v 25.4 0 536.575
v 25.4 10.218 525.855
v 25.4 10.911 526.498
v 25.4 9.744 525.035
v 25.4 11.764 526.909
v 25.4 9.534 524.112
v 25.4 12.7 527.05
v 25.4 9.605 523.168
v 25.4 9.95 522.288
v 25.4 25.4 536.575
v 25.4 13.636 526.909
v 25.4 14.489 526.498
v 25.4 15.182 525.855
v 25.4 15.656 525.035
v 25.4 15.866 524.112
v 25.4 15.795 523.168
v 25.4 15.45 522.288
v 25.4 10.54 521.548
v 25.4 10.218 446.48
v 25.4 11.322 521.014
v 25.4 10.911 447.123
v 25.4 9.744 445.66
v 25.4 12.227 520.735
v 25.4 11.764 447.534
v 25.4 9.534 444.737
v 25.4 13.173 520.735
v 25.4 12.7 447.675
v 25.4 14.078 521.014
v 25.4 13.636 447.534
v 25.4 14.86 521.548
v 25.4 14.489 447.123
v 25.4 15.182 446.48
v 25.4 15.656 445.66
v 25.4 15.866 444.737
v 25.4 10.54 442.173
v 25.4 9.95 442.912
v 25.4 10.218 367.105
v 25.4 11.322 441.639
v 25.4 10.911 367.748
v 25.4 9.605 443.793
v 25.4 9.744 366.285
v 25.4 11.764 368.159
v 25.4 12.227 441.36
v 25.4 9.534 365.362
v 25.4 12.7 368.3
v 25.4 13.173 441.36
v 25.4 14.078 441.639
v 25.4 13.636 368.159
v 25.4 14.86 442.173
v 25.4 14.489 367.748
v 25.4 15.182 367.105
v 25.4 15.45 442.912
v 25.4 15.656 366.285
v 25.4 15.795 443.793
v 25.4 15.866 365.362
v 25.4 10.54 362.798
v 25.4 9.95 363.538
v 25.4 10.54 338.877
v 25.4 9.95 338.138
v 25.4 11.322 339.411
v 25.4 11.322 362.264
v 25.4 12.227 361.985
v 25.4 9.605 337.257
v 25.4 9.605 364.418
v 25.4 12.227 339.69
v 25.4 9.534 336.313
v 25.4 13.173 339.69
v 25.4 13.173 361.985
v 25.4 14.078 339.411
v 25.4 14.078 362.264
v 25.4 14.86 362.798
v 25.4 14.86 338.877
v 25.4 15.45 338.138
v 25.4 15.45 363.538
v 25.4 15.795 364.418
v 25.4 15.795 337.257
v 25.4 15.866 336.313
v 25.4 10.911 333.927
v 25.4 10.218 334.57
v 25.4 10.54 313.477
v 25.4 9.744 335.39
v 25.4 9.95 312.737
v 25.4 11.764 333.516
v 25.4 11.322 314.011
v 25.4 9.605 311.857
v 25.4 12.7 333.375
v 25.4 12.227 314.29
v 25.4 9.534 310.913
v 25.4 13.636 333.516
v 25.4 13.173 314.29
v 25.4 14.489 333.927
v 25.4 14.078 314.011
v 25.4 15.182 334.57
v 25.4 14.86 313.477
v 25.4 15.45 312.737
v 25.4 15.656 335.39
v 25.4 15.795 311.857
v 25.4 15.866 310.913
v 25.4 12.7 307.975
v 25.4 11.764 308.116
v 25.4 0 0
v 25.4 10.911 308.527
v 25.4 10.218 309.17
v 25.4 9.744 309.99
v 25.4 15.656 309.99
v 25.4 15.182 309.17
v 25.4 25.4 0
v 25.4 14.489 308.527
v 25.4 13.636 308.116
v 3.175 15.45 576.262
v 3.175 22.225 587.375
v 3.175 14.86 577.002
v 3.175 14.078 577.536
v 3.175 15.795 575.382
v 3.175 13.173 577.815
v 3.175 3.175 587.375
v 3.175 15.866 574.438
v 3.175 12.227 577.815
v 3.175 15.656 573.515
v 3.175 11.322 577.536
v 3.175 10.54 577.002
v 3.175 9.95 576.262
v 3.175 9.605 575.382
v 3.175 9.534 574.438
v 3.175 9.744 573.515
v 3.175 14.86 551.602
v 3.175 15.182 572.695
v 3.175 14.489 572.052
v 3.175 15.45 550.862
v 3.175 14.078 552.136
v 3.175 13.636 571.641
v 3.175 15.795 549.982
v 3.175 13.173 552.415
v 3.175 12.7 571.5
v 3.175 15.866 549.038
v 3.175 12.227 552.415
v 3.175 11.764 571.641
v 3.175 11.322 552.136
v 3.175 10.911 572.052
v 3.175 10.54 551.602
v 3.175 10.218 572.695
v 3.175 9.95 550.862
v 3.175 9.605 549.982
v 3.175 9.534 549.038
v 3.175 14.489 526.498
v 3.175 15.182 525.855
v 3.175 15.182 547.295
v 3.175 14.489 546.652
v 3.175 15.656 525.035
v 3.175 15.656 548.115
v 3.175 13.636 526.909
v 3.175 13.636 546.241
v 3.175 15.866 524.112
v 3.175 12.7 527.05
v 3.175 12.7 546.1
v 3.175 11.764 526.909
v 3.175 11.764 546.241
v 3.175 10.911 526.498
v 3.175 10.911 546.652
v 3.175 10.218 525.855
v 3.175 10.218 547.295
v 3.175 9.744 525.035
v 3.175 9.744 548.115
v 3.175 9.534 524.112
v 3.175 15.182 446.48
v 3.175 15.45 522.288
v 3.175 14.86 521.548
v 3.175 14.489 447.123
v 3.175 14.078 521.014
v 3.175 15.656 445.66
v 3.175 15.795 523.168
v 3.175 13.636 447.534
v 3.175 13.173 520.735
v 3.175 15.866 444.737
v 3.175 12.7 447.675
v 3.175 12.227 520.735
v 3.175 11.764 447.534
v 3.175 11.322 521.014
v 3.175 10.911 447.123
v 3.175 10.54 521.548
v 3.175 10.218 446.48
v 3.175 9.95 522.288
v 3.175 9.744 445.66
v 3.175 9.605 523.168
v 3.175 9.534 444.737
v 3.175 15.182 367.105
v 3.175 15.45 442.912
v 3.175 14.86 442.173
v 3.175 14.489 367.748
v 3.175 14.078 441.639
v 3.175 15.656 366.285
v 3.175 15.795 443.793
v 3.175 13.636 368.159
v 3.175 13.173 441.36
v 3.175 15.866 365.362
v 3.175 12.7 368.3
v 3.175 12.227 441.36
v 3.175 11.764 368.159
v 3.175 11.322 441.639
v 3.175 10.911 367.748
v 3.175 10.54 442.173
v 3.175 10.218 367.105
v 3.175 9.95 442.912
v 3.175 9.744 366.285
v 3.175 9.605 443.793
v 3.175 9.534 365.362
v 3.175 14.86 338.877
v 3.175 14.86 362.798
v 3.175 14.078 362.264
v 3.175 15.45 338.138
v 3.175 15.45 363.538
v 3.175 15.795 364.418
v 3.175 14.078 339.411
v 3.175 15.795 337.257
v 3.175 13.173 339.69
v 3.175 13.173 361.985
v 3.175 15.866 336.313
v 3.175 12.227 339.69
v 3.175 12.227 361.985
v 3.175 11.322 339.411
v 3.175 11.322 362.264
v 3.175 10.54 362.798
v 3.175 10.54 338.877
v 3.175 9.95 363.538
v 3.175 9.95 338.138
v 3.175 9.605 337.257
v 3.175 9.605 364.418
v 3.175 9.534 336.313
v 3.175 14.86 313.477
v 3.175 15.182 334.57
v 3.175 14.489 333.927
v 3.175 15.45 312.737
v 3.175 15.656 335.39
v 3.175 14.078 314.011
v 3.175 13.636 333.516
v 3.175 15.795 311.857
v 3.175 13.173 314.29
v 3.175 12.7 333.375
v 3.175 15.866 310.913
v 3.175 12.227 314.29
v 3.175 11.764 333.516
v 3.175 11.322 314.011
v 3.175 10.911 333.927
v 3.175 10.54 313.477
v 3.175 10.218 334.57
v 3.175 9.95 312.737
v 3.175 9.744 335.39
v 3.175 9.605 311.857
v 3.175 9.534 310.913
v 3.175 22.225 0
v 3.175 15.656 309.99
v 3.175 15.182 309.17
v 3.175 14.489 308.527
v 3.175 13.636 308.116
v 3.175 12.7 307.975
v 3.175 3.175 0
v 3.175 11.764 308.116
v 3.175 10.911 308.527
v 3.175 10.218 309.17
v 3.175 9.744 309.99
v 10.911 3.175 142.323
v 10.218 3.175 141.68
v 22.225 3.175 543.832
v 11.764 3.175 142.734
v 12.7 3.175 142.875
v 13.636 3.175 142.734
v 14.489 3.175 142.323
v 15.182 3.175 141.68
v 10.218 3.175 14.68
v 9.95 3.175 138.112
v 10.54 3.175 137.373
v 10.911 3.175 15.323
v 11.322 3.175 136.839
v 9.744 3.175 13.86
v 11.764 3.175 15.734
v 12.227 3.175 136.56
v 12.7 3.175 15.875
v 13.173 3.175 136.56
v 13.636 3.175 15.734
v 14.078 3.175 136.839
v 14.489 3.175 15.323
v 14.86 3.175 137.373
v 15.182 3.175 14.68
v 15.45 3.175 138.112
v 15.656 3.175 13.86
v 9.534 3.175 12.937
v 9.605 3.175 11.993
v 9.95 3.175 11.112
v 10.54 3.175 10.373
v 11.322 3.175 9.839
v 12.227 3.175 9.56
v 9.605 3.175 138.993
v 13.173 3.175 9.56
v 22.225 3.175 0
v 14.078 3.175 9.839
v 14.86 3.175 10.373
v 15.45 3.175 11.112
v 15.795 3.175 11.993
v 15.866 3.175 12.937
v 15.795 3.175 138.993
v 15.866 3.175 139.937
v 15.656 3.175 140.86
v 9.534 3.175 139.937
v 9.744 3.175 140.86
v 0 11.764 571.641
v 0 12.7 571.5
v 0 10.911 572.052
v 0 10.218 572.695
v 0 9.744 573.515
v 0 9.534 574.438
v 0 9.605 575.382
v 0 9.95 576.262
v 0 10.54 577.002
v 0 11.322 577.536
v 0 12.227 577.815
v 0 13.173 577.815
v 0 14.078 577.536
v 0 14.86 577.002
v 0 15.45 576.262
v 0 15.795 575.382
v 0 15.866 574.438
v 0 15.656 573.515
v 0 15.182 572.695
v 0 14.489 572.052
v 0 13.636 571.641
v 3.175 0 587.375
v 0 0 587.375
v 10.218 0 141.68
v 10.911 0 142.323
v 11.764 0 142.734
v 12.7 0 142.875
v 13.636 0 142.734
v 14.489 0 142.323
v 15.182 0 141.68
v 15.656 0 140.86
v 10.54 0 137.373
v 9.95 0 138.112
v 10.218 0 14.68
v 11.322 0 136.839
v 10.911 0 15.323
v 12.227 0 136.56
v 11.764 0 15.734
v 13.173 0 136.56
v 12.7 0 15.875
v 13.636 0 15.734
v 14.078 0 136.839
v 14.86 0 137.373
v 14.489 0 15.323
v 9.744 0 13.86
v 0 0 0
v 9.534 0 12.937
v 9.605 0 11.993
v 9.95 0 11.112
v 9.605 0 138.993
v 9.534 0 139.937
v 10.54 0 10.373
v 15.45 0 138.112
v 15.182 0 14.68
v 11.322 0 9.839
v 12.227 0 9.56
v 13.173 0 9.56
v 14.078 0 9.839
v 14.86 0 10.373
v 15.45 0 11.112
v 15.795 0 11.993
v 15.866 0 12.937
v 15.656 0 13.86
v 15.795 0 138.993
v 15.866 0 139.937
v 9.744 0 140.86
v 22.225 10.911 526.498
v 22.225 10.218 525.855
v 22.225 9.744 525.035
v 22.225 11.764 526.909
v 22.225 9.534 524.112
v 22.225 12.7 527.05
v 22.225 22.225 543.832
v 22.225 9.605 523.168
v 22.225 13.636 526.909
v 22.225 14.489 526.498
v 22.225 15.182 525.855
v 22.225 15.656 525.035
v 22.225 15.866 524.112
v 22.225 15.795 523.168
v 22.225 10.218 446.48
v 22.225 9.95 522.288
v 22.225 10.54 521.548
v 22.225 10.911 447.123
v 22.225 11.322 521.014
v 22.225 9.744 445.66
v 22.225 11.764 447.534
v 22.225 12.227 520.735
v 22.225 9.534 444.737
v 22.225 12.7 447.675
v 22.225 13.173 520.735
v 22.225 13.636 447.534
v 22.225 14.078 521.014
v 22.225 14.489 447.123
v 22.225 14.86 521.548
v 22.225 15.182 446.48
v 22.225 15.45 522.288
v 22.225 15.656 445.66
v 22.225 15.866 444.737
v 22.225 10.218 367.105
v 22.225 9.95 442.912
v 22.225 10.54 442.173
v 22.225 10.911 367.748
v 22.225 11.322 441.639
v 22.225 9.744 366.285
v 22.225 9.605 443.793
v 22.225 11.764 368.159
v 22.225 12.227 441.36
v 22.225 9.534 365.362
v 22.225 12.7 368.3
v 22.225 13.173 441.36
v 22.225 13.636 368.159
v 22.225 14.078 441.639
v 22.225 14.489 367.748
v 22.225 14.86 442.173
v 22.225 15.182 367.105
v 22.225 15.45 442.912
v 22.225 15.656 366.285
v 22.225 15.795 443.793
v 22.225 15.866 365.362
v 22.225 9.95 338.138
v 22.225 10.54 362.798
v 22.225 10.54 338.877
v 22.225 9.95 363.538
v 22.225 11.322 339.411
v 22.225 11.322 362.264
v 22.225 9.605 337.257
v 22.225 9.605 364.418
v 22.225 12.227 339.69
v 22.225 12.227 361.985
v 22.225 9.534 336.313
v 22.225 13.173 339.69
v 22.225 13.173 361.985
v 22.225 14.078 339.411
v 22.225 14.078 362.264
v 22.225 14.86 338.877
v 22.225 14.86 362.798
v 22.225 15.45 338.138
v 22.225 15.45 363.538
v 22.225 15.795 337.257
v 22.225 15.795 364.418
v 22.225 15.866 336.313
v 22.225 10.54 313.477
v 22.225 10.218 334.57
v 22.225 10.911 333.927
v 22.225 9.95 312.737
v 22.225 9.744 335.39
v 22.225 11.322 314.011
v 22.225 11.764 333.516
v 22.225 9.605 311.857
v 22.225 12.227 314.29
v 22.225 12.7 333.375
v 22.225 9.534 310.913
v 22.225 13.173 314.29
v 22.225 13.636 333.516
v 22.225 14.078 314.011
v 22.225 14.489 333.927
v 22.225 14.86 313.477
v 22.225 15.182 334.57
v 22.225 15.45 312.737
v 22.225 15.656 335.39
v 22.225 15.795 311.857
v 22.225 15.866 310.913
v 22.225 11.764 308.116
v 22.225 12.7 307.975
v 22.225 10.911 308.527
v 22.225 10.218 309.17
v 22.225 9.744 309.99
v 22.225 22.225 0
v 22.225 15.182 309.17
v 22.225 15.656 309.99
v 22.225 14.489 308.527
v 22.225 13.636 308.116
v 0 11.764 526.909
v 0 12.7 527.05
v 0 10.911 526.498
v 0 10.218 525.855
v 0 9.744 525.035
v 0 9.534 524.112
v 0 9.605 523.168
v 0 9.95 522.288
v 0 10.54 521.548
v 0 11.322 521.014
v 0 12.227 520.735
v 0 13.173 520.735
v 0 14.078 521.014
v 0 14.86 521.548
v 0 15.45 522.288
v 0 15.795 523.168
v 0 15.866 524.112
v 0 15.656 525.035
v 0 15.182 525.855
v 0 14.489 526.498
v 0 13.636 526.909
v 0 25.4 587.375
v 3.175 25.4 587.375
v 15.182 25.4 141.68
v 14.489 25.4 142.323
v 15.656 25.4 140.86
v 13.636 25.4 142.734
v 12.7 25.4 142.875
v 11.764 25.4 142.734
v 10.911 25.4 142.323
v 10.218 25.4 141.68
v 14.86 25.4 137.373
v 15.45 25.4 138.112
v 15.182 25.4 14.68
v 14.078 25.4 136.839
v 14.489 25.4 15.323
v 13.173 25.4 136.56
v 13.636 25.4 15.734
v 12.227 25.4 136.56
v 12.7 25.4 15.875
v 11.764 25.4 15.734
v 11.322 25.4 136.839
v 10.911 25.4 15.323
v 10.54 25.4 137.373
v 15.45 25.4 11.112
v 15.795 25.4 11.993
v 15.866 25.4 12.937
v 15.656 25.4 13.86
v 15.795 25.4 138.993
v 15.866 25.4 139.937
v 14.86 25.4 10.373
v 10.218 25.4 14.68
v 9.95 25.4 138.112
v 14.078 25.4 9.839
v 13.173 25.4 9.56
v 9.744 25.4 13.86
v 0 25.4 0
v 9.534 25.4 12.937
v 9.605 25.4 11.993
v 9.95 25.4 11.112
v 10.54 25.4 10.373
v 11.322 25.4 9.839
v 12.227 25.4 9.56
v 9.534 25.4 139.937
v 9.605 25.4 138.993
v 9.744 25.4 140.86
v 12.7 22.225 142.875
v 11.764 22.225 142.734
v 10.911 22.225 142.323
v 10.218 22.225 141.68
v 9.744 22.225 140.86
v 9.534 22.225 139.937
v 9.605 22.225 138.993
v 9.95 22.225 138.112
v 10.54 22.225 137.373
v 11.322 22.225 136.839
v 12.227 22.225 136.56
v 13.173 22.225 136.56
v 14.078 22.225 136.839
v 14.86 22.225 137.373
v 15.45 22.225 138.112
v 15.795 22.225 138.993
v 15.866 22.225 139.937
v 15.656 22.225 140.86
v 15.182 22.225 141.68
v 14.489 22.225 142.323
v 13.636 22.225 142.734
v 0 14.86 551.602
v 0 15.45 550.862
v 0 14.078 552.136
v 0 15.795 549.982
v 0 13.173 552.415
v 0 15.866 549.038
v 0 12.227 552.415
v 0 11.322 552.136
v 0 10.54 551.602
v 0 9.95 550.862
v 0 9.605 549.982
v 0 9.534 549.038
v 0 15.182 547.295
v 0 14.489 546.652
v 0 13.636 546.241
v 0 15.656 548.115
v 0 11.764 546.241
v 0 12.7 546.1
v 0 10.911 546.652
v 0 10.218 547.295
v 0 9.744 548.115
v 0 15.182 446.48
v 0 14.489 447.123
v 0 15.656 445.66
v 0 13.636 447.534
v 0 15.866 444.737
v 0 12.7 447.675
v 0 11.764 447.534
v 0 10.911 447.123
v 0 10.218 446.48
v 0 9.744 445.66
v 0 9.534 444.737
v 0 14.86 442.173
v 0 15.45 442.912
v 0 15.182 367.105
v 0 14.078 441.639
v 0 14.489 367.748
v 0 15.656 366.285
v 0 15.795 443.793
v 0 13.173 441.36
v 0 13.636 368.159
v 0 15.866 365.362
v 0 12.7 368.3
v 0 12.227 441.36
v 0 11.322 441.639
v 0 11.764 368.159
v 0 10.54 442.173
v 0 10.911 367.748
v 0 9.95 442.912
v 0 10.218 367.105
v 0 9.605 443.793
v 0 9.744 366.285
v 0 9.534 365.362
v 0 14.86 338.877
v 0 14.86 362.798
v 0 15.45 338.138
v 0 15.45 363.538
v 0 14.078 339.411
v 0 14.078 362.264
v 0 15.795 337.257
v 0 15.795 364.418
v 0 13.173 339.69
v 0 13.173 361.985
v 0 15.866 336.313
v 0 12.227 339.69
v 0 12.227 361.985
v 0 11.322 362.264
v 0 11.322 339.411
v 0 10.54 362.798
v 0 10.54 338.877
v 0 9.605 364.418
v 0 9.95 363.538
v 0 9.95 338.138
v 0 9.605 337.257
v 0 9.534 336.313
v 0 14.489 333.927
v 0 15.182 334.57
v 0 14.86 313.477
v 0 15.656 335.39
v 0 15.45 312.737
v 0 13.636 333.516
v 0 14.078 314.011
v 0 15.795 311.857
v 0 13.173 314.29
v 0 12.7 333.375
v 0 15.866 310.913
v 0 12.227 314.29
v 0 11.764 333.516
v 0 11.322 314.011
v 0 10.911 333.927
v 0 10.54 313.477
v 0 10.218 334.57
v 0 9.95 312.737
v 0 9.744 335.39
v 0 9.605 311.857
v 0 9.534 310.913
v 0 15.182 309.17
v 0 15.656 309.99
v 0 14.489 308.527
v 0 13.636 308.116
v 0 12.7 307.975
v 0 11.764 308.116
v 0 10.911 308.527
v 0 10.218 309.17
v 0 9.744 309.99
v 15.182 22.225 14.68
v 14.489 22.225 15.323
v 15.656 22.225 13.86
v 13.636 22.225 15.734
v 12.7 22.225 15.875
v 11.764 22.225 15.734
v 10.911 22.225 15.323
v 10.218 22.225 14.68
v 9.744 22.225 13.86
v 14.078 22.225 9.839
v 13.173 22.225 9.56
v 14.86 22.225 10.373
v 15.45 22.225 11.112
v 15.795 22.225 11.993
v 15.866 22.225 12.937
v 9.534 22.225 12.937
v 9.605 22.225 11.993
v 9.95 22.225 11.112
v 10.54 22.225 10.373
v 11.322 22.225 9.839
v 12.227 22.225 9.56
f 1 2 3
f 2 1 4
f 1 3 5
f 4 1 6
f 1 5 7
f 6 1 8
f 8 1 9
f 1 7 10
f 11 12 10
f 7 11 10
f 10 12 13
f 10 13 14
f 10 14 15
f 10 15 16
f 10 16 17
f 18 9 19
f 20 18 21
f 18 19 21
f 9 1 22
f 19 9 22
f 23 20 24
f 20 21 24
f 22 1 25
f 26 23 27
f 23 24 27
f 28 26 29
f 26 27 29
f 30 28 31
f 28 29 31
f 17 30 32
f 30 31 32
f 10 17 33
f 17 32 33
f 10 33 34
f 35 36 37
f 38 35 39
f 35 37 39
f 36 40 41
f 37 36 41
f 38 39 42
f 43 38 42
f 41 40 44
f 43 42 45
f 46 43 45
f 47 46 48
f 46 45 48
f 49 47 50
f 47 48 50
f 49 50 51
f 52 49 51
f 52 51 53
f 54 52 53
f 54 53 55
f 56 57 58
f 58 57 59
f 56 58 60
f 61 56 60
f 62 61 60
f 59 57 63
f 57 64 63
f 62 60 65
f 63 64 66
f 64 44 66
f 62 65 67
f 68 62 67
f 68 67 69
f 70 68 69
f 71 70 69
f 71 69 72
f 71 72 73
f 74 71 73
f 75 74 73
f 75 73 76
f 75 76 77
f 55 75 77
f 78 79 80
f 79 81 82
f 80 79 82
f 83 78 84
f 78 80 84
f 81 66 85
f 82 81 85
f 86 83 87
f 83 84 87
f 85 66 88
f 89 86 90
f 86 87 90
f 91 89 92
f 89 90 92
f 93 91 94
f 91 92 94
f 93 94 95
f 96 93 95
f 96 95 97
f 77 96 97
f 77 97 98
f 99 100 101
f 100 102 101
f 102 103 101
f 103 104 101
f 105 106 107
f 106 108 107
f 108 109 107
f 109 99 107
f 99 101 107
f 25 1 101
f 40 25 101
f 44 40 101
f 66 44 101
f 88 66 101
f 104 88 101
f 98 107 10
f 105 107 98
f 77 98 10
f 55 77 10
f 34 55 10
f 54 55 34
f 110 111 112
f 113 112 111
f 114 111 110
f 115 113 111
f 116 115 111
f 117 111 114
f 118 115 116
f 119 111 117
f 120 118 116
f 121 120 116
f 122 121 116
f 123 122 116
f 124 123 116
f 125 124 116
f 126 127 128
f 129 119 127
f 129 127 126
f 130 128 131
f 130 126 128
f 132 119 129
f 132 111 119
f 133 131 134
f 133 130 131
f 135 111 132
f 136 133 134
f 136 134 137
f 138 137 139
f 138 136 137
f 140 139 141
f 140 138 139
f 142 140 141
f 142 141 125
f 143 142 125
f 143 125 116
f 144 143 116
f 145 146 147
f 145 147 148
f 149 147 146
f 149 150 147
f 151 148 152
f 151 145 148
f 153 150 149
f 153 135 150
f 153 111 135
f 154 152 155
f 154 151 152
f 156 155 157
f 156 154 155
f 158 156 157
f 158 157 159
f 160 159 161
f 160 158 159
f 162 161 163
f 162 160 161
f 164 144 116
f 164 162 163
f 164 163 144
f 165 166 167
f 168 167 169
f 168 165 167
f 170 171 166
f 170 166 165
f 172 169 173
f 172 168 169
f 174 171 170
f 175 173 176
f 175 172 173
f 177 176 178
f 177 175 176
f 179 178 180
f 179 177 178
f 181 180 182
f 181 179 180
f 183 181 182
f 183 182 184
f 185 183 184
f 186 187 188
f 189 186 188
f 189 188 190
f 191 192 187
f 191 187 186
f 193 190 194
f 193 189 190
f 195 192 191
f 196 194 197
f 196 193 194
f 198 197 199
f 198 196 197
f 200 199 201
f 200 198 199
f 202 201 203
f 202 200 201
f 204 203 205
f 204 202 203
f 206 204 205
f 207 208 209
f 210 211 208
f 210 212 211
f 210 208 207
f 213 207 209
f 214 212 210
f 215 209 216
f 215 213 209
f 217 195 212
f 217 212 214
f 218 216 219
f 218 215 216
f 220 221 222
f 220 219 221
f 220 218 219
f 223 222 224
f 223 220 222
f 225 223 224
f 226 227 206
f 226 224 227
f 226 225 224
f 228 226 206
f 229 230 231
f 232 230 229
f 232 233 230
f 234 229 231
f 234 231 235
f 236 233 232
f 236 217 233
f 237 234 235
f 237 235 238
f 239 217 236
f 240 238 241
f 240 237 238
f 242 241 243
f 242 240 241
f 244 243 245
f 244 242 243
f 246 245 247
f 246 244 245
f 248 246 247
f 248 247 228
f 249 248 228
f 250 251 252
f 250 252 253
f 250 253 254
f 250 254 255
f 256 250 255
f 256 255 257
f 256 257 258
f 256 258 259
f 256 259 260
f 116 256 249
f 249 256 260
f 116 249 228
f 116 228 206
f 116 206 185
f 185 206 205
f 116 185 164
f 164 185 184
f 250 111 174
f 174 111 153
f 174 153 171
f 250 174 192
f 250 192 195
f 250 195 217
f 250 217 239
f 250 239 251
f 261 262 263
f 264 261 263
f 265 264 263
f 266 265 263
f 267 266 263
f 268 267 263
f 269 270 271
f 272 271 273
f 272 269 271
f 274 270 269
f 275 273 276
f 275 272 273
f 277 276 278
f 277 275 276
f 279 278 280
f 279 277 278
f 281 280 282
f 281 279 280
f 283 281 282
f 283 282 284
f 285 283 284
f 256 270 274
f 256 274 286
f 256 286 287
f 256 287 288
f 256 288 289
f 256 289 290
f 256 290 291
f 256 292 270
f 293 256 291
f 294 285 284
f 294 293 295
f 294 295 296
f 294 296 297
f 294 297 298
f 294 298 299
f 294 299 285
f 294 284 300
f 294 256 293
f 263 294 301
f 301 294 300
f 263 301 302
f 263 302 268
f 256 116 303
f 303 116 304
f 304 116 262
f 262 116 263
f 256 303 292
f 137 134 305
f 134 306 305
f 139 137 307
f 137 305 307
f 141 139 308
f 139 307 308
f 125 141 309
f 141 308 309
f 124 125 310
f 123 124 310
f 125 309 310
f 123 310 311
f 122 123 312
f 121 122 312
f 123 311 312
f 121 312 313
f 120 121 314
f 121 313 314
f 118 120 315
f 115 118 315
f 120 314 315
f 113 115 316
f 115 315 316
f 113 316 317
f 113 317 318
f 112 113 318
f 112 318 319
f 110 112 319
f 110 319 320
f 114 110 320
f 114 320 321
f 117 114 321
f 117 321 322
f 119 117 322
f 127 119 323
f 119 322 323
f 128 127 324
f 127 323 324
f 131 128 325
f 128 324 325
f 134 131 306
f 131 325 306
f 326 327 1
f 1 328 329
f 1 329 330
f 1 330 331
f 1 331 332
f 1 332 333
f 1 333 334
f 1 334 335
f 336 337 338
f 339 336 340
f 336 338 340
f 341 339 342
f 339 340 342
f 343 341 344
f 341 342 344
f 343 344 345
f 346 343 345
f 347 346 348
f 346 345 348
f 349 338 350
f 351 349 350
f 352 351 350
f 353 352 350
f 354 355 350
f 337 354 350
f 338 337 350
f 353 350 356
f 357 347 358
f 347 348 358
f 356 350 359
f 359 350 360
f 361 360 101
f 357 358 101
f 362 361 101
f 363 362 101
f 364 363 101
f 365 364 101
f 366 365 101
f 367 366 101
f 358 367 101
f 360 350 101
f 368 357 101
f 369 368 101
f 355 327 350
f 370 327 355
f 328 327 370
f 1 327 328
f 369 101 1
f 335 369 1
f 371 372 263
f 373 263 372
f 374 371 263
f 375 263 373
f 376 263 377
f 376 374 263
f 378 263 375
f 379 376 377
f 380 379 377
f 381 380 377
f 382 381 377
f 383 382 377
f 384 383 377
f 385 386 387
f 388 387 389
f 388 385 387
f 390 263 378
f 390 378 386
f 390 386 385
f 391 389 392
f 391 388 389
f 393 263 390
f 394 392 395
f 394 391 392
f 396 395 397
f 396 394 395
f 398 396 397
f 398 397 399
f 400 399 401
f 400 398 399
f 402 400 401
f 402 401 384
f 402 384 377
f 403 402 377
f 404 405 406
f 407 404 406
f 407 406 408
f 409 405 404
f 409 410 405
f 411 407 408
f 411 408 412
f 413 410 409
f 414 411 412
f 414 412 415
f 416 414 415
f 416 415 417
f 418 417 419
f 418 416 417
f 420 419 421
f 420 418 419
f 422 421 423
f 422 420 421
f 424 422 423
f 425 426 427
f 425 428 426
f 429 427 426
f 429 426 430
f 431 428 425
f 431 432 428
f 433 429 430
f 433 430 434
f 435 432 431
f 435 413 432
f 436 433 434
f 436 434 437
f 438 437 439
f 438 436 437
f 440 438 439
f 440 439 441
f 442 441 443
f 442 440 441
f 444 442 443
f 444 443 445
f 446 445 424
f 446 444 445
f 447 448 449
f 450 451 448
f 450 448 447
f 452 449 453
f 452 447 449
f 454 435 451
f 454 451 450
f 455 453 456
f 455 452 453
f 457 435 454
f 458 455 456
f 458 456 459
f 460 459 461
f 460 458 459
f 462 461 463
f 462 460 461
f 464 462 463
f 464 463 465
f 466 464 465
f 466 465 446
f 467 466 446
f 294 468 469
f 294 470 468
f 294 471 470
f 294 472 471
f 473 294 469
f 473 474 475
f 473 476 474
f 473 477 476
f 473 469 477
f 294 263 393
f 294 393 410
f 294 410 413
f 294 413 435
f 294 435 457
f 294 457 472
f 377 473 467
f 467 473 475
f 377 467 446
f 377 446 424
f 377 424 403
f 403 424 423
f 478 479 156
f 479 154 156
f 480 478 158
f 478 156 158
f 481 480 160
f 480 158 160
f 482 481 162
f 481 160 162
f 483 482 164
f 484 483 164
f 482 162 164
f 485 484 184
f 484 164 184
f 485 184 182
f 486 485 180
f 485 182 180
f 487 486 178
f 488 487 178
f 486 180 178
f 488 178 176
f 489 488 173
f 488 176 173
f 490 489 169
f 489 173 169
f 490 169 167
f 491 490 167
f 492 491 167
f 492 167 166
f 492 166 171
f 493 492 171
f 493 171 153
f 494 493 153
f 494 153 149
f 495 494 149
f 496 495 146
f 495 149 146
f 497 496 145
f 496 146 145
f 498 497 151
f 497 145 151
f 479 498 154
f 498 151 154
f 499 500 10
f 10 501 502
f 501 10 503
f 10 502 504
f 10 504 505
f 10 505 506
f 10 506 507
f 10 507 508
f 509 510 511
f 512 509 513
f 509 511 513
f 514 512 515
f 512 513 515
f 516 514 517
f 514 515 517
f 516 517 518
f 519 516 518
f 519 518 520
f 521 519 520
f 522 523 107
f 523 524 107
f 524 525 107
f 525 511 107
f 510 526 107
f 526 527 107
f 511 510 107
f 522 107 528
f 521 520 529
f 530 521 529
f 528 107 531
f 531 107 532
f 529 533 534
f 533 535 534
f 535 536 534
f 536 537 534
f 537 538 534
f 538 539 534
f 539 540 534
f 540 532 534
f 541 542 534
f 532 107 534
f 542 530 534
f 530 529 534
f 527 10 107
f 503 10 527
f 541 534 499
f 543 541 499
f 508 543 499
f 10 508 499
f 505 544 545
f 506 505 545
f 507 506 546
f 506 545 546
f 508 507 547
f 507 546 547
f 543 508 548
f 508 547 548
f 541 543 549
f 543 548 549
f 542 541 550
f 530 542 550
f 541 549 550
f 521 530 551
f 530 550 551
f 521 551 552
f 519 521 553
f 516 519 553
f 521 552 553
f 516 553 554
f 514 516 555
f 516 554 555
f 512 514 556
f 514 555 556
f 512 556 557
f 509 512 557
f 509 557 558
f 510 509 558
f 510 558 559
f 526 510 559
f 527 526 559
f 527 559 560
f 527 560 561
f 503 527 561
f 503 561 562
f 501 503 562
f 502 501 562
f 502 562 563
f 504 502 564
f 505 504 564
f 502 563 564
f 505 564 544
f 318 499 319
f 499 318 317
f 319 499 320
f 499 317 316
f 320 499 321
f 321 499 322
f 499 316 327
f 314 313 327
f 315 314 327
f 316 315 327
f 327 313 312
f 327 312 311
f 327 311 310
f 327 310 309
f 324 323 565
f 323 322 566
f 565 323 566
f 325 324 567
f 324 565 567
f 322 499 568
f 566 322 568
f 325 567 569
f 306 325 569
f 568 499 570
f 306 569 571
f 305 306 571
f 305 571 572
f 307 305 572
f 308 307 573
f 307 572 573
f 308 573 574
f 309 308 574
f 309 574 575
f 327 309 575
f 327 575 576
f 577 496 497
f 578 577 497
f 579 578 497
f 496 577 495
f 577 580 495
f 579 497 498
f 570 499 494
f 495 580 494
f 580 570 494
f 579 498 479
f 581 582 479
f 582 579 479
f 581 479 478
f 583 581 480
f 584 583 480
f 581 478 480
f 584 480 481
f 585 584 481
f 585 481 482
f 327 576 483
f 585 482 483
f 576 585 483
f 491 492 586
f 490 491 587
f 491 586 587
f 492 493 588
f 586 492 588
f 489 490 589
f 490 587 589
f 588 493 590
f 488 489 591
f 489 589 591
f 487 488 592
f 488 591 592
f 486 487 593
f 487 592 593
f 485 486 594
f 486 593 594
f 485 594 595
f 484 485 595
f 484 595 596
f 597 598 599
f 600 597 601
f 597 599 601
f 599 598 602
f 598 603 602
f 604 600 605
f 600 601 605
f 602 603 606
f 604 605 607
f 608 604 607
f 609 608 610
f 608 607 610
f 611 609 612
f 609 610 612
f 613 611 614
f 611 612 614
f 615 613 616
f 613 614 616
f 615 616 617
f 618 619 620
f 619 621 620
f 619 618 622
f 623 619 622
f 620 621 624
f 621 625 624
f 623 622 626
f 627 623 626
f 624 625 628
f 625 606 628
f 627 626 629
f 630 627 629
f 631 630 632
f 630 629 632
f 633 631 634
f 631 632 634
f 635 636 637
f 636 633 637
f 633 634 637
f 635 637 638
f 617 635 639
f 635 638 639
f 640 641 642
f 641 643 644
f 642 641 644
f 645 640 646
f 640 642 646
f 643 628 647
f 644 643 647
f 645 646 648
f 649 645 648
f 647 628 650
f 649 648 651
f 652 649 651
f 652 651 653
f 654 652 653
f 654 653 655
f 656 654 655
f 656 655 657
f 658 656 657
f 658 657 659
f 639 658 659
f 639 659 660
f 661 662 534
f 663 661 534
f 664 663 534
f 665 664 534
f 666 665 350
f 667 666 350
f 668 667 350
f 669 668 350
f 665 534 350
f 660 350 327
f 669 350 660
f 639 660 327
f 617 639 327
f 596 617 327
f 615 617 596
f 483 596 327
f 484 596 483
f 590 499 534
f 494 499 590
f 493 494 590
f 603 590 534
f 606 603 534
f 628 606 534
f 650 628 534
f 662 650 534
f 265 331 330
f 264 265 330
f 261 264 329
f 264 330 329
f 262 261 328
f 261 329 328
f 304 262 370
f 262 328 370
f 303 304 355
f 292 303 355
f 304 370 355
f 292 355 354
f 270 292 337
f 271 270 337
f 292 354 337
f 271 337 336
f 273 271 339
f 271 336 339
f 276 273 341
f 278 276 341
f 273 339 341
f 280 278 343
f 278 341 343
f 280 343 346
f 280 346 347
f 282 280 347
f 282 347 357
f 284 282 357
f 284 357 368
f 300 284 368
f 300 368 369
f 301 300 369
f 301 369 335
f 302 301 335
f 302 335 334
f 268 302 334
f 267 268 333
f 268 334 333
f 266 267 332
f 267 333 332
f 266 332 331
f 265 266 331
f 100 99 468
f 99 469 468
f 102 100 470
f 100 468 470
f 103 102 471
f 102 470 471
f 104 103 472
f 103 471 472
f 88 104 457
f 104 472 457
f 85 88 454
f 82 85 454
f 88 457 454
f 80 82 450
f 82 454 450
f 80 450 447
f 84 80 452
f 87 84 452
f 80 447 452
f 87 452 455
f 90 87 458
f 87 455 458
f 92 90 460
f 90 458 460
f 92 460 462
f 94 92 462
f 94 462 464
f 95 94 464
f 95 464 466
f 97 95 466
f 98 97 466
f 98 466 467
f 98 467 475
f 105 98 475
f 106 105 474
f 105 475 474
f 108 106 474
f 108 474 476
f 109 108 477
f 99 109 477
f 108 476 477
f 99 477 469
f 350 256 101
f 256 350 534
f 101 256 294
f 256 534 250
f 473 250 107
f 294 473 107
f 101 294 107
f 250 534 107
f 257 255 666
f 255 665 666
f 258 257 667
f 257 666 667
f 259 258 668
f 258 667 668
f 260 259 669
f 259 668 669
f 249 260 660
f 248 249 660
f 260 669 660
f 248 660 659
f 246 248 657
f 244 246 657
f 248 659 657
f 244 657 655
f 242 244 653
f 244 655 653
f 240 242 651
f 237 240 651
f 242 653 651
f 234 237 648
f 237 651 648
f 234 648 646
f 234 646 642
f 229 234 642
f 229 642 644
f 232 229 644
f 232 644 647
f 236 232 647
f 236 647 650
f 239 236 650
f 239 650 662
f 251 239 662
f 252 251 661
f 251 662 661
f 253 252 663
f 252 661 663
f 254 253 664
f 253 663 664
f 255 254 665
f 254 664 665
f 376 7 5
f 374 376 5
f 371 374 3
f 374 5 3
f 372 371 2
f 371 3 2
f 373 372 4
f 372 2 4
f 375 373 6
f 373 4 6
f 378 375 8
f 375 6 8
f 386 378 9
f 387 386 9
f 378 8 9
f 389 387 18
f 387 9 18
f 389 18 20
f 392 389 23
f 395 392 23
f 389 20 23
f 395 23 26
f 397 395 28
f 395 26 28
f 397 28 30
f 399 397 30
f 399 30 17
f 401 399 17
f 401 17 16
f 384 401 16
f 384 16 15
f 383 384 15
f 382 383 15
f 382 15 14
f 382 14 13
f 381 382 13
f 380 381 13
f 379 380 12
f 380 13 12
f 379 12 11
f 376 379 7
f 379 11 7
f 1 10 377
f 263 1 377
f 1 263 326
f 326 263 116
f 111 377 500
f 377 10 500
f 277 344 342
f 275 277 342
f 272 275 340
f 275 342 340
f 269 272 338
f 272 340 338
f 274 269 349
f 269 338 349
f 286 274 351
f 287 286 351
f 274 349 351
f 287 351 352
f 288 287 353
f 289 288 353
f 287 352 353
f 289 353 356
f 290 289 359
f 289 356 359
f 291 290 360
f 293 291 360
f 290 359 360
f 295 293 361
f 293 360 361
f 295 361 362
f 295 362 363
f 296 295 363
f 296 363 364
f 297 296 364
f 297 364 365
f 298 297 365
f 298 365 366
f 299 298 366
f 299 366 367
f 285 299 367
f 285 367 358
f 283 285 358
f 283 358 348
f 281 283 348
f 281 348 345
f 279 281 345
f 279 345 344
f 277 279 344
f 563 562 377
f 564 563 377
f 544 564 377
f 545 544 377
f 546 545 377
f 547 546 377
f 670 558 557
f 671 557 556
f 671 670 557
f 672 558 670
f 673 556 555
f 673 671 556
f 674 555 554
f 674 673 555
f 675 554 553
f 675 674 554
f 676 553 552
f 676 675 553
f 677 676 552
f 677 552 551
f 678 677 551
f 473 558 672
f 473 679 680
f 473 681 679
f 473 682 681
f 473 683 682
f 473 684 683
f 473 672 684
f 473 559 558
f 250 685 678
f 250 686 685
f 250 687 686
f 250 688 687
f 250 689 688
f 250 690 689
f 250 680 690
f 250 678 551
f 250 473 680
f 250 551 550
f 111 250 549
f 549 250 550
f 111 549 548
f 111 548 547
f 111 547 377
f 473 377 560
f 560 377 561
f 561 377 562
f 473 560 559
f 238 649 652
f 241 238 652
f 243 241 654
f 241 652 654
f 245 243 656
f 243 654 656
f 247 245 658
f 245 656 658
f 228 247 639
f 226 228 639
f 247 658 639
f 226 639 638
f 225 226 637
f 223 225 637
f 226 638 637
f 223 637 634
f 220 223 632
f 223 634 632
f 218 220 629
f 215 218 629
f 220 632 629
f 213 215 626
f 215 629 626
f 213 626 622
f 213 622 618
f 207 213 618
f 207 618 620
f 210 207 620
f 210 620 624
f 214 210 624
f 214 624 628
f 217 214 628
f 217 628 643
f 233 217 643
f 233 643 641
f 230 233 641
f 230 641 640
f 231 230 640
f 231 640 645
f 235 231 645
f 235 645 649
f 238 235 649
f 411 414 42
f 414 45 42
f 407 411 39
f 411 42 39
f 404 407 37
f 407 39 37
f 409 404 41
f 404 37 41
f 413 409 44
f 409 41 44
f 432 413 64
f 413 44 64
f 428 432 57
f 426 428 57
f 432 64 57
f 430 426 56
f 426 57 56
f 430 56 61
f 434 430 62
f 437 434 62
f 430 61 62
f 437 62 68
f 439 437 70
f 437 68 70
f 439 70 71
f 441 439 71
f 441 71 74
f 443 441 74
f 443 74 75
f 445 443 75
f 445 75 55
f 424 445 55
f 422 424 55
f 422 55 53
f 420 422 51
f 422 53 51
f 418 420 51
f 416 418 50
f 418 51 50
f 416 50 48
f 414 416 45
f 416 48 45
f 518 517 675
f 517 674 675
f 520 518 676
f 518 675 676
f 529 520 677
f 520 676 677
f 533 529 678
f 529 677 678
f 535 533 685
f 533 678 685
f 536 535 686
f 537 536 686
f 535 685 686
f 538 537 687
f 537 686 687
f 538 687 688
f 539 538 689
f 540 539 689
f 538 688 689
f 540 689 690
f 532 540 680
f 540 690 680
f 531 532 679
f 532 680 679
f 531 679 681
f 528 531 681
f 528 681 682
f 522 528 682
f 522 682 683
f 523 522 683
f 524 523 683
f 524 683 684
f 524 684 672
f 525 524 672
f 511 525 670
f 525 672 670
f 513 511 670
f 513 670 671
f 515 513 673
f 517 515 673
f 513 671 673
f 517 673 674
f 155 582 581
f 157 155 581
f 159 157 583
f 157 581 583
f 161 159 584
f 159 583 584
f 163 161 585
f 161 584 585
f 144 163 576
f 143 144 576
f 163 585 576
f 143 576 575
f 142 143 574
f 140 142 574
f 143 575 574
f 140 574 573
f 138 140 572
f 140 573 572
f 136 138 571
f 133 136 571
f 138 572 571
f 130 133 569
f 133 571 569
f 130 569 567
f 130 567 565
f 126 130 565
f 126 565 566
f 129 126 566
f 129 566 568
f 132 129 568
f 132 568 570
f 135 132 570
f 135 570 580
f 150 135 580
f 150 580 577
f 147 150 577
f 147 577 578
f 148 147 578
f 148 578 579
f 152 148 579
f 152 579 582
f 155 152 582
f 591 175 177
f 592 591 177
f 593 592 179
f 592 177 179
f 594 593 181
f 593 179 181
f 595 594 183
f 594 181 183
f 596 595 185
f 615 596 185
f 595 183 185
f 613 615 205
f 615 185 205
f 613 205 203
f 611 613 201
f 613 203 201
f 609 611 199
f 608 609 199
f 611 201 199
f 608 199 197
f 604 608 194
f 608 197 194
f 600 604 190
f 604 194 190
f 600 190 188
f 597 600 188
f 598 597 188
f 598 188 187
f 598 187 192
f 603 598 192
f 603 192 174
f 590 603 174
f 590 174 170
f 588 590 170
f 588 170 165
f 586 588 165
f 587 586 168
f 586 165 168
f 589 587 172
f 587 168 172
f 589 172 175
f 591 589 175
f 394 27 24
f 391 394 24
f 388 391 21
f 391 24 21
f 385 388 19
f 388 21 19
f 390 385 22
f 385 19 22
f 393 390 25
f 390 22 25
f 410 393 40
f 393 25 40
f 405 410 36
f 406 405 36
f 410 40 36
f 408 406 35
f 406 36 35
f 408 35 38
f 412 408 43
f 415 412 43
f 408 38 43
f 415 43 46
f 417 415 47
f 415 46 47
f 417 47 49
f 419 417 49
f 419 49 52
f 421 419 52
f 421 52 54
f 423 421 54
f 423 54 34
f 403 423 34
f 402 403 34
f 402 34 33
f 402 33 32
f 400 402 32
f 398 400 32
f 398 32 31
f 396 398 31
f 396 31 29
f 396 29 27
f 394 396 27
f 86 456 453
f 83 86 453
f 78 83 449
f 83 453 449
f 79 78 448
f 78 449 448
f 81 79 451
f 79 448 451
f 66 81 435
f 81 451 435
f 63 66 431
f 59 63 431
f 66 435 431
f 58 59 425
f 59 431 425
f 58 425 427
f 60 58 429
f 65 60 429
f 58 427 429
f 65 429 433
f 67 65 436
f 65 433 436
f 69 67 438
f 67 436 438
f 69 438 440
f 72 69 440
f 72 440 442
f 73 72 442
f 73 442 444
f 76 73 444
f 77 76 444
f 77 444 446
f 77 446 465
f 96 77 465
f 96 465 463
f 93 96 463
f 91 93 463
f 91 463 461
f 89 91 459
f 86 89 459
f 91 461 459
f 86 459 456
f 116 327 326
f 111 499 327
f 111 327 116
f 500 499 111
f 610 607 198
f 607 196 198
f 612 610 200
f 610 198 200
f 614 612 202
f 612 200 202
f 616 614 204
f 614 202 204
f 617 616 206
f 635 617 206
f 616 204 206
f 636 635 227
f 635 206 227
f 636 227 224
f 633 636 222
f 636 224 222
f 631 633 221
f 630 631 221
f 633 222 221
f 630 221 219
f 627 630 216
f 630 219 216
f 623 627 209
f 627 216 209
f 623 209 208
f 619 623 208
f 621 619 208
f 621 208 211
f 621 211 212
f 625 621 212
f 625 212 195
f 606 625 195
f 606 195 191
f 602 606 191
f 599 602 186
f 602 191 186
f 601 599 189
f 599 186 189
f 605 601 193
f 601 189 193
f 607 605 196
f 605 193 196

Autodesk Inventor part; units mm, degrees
ref_plane "YZ Plane" through (0, 0, 0) normal (1, 0, 0) x (0, 1, 0)
ref_plane "XZ Plane" through (0, 0, 0) normal (0, 1, 0) x (-1, 0, 0)
ref_plane "XY Plane" through (0, 0, 0) normal (0, 0, 1) x (1, 0, 0)
sketch "Sketch1" plane through (0, 0, 0) normal (0, 0, 1) x (1, 0, 0)
  line L0 (0, 0) -> (25.4, 0)
  line L1 (25.4, 0) -> (25.4, 25.4)
  line L2 (25.4, 25.4) -> (0, 25.4)
  line L3 (0, 25.4) -> (0, 0)
  line L4 (3.175, 3.175) -> (22.225, 3.175)
  line L5 (22.225, 3.175) -> (22.225, 22.225)
  line L6 (22.225, 22.225) -> (3.175, 22.225)
  line L7 (3.175, 22.225) -> (3.175, 3.175)
  dimension "d0" = 25.4
  dimension "d1" = 25.4
  dimension "d2" = 19.05
  dimension "d3" = 19.05
  dimension "d4" = 3.175
  dimension "d5" = 3.175
extrude "Extrusion1" add sketch "Sketch1" along normal blind 587.375
sketch "Sketch2" plane through (0, 25.4, 0) normal (0, 1, 0) x (1, 0, 0)
  line L0 (25.4, 0) -> (0, 0) projected
  line L1 (0, 0) -> (0, -587.375) projected
  point P0 (12.7, -12.7)
  point P1 (12.7, -139.7)
  dimension "d8" = 12.7
  dimension "d9" = 12.7
  dimension "d10" = 12.7
  dimension "d11" = 139.7
hole "Hole1" at (12.7, 25.4, 12.7) at (12.7, 25.4, 139.7) direction (0, -1, 0) diameter 6.35 end through all
sketch "Sketch3" plane through (25.4, 0, 0) normal (1, 0, 0) x (0, 0, -1)
  line L0 (-587.375, 0) -> (-587.375, 25.4) projected
  line L1 (0, 0) -> (-587.375, 0) projected
  point P0 (-574.675, 12.7)
  point P1 (-549.275, 12.7)
  point P2 (-336.55, 12.7)
  point P3 (-311.15, 12.7)
  dimension "d19" = 12.7
  dimension "d20" = 12.7
  dimension "d21" = 12.7
  dimension "d22" = 25.4
  dimension "d23" = 212.725
  dimension "d24" = 25.4
  dimension "d25" = 12.7
  dimension "d26" = 12.7
hole "Hole2" at (25.4, 12.7, 574.675) at (25.4, 12.7, 549.275) at (25.4, 12.7, 336.55) at (25.4, 12.7, 311.15) direction (-1, 0, 0) diameter 6.35 end through all
sketch "Sketch6" plane through (0, 25.4, 0) normal (0, 1, 0) x (1, 0, 0)
  circle A0 centre (12.7, -12.7) radius 3.175 projected
  circle A1 centre (12.7, -139.7) radius 3.175 projected
  line L0 (25.4, 0) -> (0, 0) projected
  line L1 (0, 0) -> (0, -587.375) projected
  line L2 (25.4, -587.375) -> (0, -587.375) projected
  line L3 (25.4, 0) -> (25.4, -587.375) projected
  line L4 (25.4, -587.375) -> (3.175, -587.375)
  line L5 (0, -587.375) -> (25.4, -587.375) projected
  line L6 (25.4, -587.375) -> (25.4, -536.575)
  line L7 (25.4, 0) -> (25.4, -587.375) projected
  line L8 (25.4, -536.575) -> (3.175, -587.375)
  dimension "d41" = 22.225
  dimension "d42" = 50.8
extrude "Extrusion4" cut sketch "Sketch6" against normal blind 25.4 contours L3 L2 L8
sketch "Sketch7" plane through (0, 0, 0) normal (-1, 0, 0) x (0, 0, 1)
  line L0 (587.375, 25.4) -> (587.375, 0) projected
  line L1 (0, 25.4) -> (587.375, 25.4) projected
  point P0 (365.125, 12.7)
  point P1 (444.5, 12.7)
  point P2 (523.875, 12.7)
  dimension "d45" = 12.7
  dimension "d46" = 63.5
  dimension "d47" = 12.7
  dimension "d48" = 12.7
  dimension "d49" = 142.875
  dimension "d50" = 222.25
hole "Hole3" at (0, 12.7, 365.125) at (0, 12.7, 444.5) at (0, 12.7, 523.875) direction (1, 0, 0) diameter 6.35 end through all
properties part number "pickup arm 1x1" material "Aluminum 6061"
